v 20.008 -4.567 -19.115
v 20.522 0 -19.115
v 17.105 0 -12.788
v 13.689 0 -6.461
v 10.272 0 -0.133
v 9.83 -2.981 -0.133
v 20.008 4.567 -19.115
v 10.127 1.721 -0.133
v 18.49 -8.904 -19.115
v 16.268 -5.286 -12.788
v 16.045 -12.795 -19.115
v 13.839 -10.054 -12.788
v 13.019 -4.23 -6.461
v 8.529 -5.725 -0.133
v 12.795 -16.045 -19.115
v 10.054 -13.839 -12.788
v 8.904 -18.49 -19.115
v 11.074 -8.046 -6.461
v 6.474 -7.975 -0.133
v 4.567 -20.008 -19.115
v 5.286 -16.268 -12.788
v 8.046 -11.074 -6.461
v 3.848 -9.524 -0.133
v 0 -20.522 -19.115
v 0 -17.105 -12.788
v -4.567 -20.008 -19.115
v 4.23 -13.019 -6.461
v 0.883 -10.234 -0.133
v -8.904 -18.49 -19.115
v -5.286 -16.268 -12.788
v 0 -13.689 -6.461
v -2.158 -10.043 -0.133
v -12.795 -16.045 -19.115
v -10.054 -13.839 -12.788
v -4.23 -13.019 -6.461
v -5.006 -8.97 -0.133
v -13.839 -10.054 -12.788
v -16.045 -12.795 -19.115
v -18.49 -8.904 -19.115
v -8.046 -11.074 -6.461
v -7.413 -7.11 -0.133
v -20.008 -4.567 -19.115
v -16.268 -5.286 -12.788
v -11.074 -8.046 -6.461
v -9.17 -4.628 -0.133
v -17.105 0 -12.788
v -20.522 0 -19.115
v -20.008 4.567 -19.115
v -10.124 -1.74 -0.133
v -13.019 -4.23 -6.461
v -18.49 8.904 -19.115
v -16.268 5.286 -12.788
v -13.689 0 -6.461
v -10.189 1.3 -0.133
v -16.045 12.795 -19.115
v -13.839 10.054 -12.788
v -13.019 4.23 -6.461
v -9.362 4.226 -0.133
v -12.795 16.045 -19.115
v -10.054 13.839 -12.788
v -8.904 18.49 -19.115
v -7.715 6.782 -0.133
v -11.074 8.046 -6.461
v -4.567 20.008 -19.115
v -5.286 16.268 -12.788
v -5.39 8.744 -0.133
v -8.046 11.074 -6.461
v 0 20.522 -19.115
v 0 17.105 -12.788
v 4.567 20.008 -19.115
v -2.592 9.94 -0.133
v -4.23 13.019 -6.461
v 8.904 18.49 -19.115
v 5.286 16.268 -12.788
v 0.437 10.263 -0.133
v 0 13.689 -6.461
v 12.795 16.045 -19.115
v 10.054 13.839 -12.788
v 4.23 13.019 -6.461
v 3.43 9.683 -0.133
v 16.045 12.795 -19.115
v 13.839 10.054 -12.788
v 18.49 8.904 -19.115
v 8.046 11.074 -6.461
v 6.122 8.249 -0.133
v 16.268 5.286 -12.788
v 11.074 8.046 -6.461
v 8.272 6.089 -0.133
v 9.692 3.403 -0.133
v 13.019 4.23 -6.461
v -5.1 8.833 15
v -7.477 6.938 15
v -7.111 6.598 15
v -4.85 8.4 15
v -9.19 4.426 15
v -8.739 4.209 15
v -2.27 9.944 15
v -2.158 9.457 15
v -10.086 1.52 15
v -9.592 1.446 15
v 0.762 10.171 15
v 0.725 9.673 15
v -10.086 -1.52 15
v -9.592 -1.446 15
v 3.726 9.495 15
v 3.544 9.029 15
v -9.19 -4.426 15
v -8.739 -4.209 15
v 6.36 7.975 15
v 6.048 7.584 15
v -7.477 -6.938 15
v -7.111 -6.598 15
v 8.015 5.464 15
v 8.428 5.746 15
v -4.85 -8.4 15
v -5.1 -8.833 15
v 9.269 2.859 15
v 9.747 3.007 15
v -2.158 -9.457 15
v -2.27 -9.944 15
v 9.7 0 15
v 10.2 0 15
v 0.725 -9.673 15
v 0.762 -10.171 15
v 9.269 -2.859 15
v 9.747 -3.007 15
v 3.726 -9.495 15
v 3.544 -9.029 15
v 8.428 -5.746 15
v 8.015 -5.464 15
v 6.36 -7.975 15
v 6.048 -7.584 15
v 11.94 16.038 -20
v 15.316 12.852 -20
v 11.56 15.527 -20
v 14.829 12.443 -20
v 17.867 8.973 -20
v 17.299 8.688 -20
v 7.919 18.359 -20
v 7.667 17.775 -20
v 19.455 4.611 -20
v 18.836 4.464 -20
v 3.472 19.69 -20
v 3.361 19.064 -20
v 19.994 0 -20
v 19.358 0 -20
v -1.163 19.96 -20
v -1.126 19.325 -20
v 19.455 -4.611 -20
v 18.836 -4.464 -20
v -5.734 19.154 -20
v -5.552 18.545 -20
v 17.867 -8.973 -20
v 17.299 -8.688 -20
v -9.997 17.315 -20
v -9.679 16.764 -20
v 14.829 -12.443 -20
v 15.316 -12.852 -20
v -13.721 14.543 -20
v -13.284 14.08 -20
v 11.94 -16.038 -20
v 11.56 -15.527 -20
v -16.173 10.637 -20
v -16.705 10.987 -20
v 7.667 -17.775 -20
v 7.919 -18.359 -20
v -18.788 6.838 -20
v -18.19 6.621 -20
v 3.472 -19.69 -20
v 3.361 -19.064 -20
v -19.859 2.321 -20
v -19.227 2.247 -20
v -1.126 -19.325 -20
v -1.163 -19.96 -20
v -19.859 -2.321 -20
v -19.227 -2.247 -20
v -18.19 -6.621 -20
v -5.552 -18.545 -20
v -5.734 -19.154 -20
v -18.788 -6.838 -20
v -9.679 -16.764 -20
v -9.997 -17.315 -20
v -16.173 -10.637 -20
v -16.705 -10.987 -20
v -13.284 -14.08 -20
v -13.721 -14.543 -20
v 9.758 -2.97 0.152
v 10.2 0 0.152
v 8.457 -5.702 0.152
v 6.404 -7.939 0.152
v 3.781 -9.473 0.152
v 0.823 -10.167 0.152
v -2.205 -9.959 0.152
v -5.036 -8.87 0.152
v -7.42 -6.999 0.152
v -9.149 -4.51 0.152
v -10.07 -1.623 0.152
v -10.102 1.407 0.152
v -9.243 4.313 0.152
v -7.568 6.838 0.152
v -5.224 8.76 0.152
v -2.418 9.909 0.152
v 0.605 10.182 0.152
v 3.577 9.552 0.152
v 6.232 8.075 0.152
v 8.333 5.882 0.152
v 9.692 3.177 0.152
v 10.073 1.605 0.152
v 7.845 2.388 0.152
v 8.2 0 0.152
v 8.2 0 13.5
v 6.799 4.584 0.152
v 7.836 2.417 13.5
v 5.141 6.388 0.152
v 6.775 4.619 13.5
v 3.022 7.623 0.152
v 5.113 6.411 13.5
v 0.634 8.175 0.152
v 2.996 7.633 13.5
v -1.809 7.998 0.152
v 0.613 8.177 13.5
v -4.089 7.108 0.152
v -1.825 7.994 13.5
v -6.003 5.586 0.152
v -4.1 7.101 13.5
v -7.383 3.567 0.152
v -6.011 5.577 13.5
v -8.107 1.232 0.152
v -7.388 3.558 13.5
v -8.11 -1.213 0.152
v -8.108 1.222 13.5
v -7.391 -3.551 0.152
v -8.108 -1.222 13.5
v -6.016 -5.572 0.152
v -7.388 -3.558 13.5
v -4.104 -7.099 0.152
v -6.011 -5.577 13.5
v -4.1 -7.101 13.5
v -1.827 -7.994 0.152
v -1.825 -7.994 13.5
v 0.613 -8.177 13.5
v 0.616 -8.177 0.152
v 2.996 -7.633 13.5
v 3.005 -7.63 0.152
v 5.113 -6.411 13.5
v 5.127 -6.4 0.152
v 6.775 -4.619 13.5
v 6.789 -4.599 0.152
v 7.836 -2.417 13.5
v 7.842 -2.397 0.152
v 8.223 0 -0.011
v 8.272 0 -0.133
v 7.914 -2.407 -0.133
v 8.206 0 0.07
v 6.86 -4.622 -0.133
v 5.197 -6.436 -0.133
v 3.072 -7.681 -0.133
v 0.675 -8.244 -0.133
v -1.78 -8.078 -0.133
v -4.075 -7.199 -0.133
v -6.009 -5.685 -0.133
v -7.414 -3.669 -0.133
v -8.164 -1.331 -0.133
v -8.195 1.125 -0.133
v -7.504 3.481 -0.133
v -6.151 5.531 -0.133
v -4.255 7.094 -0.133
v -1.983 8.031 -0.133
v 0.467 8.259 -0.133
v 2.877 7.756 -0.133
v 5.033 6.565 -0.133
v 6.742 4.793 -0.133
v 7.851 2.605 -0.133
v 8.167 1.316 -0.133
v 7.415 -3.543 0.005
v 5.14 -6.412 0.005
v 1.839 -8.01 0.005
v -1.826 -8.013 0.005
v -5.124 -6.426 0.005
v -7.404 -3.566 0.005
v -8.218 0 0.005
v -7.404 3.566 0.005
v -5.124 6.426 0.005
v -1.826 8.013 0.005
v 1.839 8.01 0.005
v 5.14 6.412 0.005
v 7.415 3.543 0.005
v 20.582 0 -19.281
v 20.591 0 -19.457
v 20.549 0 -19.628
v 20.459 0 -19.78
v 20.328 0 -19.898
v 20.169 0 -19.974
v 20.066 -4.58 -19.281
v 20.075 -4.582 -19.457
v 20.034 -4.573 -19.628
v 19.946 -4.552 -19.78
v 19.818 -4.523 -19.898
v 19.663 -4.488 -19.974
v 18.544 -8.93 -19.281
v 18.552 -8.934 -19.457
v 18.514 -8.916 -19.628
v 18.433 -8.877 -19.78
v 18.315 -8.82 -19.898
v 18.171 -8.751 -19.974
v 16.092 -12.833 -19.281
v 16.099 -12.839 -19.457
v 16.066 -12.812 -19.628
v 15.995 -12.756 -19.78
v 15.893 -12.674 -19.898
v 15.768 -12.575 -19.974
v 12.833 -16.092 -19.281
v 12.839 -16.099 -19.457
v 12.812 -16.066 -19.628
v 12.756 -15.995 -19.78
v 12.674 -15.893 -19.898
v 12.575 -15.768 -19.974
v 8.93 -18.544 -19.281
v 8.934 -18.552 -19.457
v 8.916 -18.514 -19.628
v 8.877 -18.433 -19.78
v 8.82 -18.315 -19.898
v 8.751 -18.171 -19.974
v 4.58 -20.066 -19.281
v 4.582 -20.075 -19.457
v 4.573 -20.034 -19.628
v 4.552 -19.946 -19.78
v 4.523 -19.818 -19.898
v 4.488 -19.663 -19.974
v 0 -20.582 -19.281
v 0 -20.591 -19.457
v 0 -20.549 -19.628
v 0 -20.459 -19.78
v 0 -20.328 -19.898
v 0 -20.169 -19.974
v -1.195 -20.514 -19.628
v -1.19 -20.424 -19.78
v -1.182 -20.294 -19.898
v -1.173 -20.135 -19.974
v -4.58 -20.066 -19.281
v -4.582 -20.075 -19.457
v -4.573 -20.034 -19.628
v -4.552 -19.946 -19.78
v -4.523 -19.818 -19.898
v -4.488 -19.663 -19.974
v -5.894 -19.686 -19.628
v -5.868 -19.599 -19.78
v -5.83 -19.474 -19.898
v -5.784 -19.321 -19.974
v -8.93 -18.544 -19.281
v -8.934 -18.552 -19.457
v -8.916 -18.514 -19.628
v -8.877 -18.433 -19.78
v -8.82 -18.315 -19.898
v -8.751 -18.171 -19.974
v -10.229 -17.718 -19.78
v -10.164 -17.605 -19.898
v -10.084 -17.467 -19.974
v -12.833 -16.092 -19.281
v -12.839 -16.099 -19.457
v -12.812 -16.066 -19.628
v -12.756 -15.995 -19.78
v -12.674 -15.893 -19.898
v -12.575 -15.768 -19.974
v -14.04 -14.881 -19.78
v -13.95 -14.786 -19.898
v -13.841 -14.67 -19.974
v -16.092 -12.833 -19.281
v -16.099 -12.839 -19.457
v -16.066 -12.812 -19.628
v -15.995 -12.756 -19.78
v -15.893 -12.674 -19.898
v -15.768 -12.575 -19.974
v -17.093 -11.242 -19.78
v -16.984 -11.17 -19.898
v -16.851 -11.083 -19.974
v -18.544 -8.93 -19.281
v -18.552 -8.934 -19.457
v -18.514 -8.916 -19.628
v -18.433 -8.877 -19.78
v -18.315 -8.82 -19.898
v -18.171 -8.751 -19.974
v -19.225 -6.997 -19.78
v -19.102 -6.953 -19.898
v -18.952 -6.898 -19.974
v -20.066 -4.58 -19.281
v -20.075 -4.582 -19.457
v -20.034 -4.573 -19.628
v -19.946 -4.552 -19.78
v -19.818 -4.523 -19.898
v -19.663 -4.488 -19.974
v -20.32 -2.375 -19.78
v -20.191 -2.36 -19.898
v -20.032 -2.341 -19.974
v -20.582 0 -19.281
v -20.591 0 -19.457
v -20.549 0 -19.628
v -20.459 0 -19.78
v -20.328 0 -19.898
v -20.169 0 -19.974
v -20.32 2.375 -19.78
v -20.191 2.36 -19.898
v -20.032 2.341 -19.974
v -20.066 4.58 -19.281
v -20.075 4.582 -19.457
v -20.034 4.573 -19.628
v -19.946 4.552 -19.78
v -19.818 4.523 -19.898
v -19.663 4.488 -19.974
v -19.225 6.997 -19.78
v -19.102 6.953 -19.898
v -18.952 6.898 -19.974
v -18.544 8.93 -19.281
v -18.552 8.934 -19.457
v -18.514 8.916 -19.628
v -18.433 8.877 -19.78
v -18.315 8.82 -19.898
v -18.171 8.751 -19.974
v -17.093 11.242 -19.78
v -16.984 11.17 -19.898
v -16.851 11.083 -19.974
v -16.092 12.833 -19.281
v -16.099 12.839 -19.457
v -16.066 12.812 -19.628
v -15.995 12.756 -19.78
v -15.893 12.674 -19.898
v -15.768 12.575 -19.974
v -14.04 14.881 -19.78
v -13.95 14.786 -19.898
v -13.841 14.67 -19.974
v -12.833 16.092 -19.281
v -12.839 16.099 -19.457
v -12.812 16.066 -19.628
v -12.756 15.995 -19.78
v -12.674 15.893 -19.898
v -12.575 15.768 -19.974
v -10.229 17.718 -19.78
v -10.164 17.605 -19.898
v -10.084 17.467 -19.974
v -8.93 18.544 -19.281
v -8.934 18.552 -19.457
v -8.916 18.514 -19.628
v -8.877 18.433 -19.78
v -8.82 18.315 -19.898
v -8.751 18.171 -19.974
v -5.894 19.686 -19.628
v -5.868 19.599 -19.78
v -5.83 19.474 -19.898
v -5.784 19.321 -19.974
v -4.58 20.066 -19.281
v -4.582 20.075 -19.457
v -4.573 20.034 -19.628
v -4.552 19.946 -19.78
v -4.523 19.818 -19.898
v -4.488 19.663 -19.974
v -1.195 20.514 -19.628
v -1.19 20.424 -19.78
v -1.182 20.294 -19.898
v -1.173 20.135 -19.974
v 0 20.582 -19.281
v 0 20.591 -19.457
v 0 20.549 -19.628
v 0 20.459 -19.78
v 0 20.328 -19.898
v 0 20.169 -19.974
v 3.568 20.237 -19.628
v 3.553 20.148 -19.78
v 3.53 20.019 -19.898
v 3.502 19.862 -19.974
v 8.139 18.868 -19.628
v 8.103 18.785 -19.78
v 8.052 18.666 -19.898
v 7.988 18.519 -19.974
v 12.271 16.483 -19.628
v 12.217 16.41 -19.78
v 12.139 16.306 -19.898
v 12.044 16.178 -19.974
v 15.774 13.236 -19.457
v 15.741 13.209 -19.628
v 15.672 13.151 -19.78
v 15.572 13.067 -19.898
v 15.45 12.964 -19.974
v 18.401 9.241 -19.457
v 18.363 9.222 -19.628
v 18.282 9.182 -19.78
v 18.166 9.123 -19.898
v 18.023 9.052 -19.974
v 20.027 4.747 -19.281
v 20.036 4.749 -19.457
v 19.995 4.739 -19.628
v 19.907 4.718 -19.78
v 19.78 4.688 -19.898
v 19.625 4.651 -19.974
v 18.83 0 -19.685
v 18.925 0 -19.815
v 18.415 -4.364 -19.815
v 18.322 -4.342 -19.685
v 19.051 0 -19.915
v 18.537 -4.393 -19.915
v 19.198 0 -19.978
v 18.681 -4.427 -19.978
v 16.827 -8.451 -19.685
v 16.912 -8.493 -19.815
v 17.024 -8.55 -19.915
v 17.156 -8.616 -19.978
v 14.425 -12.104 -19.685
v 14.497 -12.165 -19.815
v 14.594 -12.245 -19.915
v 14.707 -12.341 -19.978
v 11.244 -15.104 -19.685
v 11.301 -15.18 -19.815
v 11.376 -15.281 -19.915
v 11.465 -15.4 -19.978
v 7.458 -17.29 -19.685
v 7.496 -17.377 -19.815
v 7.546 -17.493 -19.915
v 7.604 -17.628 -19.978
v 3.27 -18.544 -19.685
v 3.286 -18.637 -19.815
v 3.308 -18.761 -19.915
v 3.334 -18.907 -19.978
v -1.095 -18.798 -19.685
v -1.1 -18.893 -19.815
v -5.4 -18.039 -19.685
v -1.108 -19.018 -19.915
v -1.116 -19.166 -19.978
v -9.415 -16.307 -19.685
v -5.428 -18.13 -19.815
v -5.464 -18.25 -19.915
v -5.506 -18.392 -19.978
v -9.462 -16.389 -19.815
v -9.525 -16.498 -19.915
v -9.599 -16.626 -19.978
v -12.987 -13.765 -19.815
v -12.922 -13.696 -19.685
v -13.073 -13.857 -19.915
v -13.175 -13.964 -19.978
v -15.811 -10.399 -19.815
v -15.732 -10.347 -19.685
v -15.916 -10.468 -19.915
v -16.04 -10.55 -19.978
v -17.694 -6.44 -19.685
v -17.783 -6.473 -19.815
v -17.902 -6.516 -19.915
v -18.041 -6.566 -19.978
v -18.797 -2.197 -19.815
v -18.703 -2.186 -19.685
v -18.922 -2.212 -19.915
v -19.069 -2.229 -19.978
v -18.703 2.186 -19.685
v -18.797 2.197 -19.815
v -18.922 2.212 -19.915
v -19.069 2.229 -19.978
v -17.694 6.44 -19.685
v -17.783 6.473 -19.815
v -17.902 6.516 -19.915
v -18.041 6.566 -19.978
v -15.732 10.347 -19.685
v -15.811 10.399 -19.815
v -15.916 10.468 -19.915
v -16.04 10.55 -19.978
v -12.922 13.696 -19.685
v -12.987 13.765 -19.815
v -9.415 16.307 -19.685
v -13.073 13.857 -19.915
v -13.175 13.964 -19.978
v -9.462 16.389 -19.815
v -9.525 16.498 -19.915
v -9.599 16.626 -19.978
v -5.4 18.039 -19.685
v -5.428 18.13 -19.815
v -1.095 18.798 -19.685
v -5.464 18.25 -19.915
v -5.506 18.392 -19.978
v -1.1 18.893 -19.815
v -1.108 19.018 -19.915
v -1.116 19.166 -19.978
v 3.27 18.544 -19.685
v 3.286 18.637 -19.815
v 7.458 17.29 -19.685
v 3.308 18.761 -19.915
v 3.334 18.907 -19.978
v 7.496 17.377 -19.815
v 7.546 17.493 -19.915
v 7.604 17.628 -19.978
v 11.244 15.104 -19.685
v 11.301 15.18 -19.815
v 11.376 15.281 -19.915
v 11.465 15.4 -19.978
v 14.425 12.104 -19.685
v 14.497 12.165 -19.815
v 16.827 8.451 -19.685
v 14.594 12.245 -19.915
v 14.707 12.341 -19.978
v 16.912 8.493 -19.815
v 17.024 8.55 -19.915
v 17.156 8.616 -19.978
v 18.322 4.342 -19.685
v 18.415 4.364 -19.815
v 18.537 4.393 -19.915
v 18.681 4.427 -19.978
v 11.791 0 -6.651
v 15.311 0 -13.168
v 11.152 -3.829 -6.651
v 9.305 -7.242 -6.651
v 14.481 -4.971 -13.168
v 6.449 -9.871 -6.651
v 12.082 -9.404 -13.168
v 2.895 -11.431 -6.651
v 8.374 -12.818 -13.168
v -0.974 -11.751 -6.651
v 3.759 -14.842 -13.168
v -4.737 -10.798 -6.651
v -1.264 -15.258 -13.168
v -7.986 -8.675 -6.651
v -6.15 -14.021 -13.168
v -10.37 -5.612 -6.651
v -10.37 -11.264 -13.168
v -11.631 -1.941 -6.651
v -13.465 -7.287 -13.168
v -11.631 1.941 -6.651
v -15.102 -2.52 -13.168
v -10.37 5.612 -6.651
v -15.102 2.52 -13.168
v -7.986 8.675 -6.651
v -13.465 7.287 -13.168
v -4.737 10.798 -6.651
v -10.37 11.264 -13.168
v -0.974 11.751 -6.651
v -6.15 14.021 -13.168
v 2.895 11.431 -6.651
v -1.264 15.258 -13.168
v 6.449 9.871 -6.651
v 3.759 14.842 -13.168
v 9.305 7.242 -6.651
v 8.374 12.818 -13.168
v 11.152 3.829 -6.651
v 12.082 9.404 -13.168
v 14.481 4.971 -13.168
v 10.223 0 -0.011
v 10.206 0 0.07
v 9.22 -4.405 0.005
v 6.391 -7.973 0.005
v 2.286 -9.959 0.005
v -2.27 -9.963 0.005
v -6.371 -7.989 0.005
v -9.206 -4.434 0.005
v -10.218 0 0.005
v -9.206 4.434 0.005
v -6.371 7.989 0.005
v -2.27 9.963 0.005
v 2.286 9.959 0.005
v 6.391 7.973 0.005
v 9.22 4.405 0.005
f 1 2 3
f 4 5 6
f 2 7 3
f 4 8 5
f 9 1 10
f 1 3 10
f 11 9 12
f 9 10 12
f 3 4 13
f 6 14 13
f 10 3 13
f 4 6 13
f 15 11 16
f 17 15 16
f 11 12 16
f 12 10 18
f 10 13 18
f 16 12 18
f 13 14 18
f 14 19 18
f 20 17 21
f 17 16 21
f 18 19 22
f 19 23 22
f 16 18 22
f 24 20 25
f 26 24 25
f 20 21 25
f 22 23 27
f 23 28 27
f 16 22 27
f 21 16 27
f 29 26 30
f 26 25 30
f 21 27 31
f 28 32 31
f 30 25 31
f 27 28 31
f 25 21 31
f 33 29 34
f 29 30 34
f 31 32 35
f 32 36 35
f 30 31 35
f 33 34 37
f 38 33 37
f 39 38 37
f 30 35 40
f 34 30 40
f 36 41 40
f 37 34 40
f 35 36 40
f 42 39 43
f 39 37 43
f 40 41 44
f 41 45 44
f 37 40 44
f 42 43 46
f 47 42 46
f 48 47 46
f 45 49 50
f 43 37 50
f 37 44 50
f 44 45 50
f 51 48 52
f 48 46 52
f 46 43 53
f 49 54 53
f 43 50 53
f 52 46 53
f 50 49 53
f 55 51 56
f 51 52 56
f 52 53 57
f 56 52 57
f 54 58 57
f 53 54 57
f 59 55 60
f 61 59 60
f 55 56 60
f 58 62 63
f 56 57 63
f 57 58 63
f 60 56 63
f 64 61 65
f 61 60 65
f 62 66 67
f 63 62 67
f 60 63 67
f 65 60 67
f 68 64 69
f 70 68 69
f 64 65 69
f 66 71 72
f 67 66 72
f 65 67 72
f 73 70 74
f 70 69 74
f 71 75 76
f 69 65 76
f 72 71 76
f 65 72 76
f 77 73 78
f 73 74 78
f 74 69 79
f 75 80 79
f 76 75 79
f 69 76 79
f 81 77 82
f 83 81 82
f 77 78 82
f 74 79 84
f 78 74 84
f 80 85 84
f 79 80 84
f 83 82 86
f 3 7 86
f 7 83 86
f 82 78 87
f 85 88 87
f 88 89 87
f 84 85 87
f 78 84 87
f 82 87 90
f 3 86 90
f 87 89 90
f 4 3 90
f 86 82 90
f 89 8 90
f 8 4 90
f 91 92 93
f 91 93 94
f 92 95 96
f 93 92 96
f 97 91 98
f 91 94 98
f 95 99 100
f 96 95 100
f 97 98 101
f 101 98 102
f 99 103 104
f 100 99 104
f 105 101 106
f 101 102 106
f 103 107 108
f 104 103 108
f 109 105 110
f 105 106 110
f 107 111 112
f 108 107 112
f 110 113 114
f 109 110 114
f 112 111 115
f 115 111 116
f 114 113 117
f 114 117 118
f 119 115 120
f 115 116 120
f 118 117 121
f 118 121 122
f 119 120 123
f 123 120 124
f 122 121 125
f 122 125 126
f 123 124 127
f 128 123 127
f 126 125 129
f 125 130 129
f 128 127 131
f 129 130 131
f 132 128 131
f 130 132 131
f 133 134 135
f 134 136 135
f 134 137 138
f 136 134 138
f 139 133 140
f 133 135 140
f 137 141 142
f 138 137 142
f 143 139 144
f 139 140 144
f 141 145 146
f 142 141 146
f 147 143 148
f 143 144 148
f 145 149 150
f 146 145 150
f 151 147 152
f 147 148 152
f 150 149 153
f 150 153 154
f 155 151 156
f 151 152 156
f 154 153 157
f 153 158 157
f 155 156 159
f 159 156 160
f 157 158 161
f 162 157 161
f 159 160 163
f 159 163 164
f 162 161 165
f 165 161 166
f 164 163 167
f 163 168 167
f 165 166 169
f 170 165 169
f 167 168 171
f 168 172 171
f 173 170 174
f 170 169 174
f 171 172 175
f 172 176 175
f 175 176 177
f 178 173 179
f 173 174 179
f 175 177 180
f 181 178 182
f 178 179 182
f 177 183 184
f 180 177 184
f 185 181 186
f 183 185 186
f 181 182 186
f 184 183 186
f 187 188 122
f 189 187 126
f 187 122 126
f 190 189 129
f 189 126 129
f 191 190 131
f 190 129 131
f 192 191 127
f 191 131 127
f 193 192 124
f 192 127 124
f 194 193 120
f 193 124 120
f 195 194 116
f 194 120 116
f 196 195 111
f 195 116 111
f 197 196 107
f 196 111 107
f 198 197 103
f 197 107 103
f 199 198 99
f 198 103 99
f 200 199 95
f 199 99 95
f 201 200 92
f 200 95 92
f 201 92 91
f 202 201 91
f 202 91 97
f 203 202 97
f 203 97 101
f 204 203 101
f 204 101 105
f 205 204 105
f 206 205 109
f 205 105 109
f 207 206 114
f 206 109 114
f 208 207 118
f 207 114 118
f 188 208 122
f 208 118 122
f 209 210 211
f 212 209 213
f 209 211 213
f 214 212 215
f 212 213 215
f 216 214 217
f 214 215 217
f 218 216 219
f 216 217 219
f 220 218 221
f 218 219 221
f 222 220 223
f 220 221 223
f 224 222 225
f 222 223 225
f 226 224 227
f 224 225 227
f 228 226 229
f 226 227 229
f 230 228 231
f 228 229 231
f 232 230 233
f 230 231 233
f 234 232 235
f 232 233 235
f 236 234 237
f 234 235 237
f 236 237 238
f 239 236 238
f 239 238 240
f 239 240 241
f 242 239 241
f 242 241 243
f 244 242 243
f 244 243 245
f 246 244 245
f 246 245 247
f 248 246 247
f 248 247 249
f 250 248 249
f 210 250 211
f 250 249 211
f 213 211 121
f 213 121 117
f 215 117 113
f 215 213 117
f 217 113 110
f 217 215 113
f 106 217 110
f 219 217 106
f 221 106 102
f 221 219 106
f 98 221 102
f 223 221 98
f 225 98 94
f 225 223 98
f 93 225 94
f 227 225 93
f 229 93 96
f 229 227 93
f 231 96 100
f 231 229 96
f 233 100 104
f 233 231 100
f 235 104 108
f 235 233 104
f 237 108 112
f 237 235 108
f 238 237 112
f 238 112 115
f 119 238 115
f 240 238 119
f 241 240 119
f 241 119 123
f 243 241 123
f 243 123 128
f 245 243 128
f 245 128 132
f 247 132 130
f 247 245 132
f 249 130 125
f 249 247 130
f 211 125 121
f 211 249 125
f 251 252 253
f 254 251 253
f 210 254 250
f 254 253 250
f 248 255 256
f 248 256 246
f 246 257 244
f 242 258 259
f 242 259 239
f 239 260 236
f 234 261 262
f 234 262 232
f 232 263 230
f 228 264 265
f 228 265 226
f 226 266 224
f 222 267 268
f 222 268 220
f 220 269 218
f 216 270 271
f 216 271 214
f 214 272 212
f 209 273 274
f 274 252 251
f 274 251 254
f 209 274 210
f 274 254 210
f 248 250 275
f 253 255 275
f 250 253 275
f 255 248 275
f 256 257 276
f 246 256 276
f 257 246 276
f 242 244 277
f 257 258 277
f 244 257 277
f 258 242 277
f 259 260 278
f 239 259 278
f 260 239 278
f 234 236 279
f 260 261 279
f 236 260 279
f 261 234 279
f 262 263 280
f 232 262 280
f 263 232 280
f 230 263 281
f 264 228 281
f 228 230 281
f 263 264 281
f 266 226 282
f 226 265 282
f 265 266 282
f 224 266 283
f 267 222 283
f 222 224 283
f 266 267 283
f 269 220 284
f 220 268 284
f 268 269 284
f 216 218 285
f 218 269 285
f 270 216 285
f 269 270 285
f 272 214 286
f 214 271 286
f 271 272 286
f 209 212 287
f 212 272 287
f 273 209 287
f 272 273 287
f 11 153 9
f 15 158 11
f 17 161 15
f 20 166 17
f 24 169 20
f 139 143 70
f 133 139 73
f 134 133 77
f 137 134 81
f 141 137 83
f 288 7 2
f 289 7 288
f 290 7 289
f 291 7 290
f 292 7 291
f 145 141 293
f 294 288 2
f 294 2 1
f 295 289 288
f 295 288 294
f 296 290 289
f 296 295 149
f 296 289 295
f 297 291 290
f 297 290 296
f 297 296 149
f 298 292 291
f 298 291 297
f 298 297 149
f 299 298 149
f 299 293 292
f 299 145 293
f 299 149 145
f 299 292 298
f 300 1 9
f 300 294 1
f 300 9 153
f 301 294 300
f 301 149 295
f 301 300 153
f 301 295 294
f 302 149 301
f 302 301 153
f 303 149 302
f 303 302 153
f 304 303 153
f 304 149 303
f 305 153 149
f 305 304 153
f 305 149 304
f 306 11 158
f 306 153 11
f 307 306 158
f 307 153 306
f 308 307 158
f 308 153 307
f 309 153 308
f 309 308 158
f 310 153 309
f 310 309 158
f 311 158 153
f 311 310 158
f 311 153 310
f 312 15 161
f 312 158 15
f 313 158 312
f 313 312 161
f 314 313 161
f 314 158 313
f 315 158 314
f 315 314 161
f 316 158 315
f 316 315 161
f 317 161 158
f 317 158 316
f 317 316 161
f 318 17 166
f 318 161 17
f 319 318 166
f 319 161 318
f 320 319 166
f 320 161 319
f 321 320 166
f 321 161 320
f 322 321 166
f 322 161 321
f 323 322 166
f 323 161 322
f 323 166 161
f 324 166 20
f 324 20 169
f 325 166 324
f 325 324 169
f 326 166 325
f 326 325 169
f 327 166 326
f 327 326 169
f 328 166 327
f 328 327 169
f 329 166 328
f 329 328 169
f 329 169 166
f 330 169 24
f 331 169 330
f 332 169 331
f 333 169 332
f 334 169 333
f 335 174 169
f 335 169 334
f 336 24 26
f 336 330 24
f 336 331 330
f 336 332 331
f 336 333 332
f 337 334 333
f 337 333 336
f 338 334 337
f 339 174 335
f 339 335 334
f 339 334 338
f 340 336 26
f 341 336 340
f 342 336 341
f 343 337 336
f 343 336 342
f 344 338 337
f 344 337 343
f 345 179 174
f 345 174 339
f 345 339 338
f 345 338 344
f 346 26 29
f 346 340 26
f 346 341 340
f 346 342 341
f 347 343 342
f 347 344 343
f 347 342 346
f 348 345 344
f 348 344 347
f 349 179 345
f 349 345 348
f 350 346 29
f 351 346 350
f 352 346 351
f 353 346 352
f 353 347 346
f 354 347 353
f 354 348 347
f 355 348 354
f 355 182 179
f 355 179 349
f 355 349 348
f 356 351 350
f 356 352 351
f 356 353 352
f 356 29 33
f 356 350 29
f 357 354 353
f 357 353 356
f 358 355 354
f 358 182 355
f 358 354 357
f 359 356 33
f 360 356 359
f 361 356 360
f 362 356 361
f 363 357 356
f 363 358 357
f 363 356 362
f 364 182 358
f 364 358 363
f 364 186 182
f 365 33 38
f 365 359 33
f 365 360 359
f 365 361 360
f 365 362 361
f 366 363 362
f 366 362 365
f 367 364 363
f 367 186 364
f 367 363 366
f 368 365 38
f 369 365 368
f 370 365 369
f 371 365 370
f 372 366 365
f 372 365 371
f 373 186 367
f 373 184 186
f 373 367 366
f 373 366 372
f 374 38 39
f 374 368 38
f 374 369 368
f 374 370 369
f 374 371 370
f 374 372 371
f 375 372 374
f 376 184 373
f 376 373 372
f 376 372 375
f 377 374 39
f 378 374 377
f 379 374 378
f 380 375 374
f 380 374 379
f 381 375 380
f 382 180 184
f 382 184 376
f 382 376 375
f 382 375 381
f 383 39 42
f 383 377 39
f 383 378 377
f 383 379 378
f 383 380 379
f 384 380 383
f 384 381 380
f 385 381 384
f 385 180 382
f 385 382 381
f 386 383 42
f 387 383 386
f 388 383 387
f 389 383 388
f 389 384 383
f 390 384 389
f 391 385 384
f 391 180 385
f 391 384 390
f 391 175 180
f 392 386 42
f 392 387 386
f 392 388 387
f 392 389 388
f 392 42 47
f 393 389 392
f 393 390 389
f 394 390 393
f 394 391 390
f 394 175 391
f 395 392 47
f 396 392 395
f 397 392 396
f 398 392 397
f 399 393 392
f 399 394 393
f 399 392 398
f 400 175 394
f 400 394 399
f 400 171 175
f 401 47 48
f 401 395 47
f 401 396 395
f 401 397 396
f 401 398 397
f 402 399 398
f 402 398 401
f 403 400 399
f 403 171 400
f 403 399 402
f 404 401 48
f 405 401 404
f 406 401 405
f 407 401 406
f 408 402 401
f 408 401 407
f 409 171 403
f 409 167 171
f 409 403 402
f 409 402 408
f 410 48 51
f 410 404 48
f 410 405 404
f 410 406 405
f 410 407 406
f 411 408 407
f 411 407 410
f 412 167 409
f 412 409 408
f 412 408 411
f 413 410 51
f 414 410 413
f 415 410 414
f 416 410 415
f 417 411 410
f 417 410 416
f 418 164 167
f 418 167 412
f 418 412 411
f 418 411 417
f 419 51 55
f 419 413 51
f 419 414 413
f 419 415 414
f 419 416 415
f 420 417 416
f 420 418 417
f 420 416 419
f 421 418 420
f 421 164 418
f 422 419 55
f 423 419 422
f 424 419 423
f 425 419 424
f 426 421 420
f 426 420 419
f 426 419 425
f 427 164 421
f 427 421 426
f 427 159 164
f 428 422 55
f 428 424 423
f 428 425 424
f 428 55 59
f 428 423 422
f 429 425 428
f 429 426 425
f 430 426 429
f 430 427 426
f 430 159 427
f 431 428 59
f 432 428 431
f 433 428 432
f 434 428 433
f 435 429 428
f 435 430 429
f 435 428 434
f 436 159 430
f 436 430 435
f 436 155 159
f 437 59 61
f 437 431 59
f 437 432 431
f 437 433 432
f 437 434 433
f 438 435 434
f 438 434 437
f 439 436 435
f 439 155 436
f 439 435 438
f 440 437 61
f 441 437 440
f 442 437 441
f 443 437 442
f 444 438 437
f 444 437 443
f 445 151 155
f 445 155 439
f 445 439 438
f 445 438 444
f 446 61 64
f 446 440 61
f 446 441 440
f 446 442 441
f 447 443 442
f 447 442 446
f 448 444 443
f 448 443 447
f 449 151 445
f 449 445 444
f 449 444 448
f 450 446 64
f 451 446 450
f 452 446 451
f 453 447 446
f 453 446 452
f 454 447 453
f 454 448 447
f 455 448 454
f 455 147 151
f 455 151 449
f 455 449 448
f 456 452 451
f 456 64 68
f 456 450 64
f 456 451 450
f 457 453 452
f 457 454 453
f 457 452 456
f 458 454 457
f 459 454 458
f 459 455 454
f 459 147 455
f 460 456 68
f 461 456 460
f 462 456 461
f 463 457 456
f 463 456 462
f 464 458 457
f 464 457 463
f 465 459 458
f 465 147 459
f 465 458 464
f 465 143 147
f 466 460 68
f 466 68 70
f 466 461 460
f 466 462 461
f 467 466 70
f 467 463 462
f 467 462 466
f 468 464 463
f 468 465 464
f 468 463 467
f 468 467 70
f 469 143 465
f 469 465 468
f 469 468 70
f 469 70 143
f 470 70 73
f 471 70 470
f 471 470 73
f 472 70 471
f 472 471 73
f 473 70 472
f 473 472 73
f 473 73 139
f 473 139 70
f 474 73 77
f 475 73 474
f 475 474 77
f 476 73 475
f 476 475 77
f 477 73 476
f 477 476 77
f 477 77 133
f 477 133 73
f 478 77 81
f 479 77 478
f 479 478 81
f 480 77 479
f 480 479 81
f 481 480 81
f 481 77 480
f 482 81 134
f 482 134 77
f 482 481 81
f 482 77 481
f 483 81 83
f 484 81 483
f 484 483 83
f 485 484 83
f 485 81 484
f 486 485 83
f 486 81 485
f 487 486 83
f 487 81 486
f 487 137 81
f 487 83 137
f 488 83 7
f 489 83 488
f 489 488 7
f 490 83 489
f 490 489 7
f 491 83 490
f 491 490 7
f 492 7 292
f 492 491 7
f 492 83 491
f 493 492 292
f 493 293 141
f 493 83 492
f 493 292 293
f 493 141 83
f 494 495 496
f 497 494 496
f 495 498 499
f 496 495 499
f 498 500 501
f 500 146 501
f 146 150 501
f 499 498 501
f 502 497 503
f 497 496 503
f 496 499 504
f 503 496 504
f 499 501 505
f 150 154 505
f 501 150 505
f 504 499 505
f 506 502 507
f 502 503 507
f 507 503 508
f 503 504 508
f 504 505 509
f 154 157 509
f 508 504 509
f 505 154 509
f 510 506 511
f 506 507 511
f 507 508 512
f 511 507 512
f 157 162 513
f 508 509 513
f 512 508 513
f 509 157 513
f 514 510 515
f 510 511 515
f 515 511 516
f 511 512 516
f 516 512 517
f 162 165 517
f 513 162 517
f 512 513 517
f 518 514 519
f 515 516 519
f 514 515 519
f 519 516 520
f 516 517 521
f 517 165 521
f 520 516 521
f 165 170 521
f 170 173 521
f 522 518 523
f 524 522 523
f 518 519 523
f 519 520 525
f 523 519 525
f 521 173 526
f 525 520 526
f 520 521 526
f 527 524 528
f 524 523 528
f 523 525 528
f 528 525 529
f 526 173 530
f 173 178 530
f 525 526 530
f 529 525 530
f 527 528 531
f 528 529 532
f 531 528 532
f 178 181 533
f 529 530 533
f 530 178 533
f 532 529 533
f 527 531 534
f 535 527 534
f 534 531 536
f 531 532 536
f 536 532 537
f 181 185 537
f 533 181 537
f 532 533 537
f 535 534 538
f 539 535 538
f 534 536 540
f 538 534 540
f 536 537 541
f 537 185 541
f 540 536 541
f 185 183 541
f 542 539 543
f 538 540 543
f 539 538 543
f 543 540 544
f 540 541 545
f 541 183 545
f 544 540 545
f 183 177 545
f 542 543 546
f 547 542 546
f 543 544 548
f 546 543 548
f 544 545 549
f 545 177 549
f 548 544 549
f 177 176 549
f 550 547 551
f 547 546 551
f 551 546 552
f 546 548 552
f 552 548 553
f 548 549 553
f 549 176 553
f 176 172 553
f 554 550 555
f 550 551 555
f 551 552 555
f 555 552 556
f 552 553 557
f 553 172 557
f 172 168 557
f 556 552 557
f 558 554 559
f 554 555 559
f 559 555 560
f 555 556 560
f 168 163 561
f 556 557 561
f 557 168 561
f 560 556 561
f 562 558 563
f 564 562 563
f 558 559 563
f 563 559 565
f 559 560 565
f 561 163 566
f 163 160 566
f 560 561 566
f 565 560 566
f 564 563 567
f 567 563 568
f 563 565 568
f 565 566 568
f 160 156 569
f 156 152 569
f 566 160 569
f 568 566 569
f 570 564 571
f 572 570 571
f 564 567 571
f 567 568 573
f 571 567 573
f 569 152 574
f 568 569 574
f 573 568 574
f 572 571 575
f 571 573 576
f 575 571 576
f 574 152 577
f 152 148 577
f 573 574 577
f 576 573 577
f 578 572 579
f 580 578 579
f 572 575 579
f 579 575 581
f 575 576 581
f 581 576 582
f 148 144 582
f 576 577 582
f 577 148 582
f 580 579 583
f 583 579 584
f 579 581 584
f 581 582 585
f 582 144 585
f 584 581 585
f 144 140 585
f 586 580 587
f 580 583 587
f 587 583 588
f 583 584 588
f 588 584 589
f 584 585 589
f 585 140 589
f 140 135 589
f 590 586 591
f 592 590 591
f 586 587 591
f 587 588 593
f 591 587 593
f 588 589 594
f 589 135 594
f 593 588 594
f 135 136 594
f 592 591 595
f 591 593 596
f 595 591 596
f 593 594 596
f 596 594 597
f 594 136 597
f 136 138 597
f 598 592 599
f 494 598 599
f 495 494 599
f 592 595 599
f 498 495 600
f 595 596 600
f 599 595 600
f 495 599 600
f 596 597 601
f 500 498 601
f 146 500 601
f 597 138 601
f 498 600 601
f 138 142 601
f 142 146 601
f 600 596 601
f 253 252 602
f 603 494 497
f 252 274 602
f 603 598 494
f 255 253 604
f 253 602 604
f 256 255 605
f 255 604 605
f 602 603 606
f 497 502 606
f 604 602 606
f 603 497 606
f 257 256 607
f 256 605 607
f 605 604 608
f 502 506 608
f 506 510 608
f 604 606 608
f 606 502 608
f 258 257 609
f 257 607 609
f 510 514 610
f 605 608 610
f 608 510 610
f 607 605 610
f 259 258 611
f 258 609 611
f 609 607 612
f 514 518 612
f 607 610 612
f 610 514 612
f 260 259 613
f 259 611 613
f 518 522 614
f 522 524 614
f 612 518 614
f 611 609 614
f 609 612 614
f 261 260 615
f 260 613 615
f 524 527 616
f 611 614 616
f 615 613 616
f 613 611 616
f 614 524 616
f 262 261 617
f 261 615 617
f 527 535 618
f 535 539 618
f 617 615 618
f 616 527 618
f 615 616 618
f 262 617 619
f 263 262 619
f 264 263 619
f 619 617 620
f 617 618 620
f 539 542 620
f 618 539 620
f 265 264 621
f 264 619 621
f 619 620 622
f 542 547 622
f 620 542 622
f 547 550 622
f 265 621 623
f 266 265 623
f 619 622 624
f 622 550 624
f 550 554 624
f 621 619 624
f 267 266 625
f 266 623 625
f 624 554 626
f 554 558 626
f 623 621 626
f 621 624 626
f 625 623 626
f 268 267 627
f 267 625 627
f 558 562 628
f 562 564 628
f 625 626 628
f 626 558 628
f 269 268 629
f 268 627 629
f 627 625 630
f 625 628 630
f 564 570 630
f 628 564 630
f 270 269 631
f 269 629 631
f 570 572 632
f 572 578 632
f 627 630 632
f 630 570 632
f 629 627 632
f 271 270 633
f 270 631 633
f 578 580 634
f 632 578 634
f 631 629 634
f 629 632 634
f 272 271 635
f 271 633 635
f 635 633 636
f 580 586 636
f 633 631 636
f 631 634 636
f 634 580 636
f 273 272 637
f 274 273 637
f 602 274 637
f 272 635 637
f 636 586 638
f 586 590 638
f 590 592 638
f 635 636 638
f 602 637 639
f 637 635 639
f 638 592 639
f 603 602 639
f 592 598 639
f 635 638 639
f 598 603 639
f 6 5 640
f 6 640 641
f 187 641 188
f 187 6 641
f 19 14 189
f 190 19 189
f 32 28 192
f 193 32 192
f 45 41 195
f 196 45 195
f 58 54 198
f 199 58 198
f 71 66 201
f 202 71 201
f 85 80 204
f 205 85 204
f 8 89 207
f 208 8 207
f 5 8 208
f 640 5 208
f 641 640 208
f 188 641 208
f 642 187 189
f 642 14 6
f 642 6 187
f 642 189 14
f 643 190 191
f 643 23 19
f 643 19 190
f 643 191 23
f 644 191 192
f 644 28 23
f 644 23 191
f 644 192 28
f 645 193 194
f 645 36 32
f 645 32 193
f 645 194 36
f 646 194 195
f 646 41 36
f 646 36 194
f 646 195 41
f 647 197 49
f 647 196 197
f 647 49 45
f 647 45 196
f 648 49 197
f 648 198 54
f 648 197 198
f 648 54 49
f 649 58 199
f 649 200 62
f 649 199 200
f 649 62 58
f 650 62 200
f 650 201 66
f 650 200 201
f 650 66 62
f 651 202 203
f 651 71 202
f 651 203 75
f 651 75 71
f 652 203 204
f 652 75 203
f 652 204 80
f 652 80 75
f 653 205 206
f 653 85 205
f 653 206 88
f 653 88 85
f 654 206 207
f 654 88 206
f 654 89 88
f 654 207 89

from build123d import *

# Parameters (mm, degrees)
SKETCH3_R          = 8.2
CUT_EXTRUDE1_DEPTH = 40
CHAMFER1_SIZE      = 1.5
FILLET2_R          = 0.6
FILLET3_R          = 0.6
FILLET4_R          = 0.6


with BuildPart() as part:
    # Sketch2 → Revolve1 (revolve)
    with BuildSketch(Plane(origin=(0, 0, 0), x_dir=(0, 0, -1), z_dir=(1, 0, 0)), mode=Mode.PRIVATE) as revolve1_sk:
        Polygon((-15, 10.2), (-15, 0), (0, 0), (0, 8.2), (20, 19), (20, 21), (0, 10.2), align=None)
    revolve(revolve1_sk.sketch.rotate(Axis((0, 0, 15), (0, 0, -1)), 90), axis=Axis((0, 0, 15), (0, 0, -1)))

    # Sketch3 → Cut-Extrude1 (cut)
    with BuildSketch(Plane.XY.offset(15)):
        Circle(SKETCH3_R)
    extrude(amount=-CUT_EXTRUDE1_DEPTH, mode=Mode.SUBTRACT)

    # Chamfer1
    chamfer1_edges = [part.edges().sort_by_distance(p)[0] for p in [
        (-8.2, 0, 15),
    ]]
    chamfer(chamfer1_edges, length=CHAMFER1_SIZE)

    # Fillet2
    fillet2_edges = [part.edges().sort_by_distance(p)[0] for p in [
        (-21, 0, -20),
        (-19, 0, -20),
    ]]
    fillet(fillet2_edges, radius=FILLET2_R)

    # Fillet3
    fillet3_edges = [part.edges().sort_by_distance(p)[0] for p in [
        (-10.2, 0, 0),
    ]]
    fillet(fillet3_edges, radius=FILLET3_R)

    # Fillet4
    fillet4_edges = [part.edges().sort_by_distance(p)[0] for p in [
        (-8.2, 0, 0),
    ]]
    fillet(fillet4_edges, radius=FILLET4_R)


solid = part.part
